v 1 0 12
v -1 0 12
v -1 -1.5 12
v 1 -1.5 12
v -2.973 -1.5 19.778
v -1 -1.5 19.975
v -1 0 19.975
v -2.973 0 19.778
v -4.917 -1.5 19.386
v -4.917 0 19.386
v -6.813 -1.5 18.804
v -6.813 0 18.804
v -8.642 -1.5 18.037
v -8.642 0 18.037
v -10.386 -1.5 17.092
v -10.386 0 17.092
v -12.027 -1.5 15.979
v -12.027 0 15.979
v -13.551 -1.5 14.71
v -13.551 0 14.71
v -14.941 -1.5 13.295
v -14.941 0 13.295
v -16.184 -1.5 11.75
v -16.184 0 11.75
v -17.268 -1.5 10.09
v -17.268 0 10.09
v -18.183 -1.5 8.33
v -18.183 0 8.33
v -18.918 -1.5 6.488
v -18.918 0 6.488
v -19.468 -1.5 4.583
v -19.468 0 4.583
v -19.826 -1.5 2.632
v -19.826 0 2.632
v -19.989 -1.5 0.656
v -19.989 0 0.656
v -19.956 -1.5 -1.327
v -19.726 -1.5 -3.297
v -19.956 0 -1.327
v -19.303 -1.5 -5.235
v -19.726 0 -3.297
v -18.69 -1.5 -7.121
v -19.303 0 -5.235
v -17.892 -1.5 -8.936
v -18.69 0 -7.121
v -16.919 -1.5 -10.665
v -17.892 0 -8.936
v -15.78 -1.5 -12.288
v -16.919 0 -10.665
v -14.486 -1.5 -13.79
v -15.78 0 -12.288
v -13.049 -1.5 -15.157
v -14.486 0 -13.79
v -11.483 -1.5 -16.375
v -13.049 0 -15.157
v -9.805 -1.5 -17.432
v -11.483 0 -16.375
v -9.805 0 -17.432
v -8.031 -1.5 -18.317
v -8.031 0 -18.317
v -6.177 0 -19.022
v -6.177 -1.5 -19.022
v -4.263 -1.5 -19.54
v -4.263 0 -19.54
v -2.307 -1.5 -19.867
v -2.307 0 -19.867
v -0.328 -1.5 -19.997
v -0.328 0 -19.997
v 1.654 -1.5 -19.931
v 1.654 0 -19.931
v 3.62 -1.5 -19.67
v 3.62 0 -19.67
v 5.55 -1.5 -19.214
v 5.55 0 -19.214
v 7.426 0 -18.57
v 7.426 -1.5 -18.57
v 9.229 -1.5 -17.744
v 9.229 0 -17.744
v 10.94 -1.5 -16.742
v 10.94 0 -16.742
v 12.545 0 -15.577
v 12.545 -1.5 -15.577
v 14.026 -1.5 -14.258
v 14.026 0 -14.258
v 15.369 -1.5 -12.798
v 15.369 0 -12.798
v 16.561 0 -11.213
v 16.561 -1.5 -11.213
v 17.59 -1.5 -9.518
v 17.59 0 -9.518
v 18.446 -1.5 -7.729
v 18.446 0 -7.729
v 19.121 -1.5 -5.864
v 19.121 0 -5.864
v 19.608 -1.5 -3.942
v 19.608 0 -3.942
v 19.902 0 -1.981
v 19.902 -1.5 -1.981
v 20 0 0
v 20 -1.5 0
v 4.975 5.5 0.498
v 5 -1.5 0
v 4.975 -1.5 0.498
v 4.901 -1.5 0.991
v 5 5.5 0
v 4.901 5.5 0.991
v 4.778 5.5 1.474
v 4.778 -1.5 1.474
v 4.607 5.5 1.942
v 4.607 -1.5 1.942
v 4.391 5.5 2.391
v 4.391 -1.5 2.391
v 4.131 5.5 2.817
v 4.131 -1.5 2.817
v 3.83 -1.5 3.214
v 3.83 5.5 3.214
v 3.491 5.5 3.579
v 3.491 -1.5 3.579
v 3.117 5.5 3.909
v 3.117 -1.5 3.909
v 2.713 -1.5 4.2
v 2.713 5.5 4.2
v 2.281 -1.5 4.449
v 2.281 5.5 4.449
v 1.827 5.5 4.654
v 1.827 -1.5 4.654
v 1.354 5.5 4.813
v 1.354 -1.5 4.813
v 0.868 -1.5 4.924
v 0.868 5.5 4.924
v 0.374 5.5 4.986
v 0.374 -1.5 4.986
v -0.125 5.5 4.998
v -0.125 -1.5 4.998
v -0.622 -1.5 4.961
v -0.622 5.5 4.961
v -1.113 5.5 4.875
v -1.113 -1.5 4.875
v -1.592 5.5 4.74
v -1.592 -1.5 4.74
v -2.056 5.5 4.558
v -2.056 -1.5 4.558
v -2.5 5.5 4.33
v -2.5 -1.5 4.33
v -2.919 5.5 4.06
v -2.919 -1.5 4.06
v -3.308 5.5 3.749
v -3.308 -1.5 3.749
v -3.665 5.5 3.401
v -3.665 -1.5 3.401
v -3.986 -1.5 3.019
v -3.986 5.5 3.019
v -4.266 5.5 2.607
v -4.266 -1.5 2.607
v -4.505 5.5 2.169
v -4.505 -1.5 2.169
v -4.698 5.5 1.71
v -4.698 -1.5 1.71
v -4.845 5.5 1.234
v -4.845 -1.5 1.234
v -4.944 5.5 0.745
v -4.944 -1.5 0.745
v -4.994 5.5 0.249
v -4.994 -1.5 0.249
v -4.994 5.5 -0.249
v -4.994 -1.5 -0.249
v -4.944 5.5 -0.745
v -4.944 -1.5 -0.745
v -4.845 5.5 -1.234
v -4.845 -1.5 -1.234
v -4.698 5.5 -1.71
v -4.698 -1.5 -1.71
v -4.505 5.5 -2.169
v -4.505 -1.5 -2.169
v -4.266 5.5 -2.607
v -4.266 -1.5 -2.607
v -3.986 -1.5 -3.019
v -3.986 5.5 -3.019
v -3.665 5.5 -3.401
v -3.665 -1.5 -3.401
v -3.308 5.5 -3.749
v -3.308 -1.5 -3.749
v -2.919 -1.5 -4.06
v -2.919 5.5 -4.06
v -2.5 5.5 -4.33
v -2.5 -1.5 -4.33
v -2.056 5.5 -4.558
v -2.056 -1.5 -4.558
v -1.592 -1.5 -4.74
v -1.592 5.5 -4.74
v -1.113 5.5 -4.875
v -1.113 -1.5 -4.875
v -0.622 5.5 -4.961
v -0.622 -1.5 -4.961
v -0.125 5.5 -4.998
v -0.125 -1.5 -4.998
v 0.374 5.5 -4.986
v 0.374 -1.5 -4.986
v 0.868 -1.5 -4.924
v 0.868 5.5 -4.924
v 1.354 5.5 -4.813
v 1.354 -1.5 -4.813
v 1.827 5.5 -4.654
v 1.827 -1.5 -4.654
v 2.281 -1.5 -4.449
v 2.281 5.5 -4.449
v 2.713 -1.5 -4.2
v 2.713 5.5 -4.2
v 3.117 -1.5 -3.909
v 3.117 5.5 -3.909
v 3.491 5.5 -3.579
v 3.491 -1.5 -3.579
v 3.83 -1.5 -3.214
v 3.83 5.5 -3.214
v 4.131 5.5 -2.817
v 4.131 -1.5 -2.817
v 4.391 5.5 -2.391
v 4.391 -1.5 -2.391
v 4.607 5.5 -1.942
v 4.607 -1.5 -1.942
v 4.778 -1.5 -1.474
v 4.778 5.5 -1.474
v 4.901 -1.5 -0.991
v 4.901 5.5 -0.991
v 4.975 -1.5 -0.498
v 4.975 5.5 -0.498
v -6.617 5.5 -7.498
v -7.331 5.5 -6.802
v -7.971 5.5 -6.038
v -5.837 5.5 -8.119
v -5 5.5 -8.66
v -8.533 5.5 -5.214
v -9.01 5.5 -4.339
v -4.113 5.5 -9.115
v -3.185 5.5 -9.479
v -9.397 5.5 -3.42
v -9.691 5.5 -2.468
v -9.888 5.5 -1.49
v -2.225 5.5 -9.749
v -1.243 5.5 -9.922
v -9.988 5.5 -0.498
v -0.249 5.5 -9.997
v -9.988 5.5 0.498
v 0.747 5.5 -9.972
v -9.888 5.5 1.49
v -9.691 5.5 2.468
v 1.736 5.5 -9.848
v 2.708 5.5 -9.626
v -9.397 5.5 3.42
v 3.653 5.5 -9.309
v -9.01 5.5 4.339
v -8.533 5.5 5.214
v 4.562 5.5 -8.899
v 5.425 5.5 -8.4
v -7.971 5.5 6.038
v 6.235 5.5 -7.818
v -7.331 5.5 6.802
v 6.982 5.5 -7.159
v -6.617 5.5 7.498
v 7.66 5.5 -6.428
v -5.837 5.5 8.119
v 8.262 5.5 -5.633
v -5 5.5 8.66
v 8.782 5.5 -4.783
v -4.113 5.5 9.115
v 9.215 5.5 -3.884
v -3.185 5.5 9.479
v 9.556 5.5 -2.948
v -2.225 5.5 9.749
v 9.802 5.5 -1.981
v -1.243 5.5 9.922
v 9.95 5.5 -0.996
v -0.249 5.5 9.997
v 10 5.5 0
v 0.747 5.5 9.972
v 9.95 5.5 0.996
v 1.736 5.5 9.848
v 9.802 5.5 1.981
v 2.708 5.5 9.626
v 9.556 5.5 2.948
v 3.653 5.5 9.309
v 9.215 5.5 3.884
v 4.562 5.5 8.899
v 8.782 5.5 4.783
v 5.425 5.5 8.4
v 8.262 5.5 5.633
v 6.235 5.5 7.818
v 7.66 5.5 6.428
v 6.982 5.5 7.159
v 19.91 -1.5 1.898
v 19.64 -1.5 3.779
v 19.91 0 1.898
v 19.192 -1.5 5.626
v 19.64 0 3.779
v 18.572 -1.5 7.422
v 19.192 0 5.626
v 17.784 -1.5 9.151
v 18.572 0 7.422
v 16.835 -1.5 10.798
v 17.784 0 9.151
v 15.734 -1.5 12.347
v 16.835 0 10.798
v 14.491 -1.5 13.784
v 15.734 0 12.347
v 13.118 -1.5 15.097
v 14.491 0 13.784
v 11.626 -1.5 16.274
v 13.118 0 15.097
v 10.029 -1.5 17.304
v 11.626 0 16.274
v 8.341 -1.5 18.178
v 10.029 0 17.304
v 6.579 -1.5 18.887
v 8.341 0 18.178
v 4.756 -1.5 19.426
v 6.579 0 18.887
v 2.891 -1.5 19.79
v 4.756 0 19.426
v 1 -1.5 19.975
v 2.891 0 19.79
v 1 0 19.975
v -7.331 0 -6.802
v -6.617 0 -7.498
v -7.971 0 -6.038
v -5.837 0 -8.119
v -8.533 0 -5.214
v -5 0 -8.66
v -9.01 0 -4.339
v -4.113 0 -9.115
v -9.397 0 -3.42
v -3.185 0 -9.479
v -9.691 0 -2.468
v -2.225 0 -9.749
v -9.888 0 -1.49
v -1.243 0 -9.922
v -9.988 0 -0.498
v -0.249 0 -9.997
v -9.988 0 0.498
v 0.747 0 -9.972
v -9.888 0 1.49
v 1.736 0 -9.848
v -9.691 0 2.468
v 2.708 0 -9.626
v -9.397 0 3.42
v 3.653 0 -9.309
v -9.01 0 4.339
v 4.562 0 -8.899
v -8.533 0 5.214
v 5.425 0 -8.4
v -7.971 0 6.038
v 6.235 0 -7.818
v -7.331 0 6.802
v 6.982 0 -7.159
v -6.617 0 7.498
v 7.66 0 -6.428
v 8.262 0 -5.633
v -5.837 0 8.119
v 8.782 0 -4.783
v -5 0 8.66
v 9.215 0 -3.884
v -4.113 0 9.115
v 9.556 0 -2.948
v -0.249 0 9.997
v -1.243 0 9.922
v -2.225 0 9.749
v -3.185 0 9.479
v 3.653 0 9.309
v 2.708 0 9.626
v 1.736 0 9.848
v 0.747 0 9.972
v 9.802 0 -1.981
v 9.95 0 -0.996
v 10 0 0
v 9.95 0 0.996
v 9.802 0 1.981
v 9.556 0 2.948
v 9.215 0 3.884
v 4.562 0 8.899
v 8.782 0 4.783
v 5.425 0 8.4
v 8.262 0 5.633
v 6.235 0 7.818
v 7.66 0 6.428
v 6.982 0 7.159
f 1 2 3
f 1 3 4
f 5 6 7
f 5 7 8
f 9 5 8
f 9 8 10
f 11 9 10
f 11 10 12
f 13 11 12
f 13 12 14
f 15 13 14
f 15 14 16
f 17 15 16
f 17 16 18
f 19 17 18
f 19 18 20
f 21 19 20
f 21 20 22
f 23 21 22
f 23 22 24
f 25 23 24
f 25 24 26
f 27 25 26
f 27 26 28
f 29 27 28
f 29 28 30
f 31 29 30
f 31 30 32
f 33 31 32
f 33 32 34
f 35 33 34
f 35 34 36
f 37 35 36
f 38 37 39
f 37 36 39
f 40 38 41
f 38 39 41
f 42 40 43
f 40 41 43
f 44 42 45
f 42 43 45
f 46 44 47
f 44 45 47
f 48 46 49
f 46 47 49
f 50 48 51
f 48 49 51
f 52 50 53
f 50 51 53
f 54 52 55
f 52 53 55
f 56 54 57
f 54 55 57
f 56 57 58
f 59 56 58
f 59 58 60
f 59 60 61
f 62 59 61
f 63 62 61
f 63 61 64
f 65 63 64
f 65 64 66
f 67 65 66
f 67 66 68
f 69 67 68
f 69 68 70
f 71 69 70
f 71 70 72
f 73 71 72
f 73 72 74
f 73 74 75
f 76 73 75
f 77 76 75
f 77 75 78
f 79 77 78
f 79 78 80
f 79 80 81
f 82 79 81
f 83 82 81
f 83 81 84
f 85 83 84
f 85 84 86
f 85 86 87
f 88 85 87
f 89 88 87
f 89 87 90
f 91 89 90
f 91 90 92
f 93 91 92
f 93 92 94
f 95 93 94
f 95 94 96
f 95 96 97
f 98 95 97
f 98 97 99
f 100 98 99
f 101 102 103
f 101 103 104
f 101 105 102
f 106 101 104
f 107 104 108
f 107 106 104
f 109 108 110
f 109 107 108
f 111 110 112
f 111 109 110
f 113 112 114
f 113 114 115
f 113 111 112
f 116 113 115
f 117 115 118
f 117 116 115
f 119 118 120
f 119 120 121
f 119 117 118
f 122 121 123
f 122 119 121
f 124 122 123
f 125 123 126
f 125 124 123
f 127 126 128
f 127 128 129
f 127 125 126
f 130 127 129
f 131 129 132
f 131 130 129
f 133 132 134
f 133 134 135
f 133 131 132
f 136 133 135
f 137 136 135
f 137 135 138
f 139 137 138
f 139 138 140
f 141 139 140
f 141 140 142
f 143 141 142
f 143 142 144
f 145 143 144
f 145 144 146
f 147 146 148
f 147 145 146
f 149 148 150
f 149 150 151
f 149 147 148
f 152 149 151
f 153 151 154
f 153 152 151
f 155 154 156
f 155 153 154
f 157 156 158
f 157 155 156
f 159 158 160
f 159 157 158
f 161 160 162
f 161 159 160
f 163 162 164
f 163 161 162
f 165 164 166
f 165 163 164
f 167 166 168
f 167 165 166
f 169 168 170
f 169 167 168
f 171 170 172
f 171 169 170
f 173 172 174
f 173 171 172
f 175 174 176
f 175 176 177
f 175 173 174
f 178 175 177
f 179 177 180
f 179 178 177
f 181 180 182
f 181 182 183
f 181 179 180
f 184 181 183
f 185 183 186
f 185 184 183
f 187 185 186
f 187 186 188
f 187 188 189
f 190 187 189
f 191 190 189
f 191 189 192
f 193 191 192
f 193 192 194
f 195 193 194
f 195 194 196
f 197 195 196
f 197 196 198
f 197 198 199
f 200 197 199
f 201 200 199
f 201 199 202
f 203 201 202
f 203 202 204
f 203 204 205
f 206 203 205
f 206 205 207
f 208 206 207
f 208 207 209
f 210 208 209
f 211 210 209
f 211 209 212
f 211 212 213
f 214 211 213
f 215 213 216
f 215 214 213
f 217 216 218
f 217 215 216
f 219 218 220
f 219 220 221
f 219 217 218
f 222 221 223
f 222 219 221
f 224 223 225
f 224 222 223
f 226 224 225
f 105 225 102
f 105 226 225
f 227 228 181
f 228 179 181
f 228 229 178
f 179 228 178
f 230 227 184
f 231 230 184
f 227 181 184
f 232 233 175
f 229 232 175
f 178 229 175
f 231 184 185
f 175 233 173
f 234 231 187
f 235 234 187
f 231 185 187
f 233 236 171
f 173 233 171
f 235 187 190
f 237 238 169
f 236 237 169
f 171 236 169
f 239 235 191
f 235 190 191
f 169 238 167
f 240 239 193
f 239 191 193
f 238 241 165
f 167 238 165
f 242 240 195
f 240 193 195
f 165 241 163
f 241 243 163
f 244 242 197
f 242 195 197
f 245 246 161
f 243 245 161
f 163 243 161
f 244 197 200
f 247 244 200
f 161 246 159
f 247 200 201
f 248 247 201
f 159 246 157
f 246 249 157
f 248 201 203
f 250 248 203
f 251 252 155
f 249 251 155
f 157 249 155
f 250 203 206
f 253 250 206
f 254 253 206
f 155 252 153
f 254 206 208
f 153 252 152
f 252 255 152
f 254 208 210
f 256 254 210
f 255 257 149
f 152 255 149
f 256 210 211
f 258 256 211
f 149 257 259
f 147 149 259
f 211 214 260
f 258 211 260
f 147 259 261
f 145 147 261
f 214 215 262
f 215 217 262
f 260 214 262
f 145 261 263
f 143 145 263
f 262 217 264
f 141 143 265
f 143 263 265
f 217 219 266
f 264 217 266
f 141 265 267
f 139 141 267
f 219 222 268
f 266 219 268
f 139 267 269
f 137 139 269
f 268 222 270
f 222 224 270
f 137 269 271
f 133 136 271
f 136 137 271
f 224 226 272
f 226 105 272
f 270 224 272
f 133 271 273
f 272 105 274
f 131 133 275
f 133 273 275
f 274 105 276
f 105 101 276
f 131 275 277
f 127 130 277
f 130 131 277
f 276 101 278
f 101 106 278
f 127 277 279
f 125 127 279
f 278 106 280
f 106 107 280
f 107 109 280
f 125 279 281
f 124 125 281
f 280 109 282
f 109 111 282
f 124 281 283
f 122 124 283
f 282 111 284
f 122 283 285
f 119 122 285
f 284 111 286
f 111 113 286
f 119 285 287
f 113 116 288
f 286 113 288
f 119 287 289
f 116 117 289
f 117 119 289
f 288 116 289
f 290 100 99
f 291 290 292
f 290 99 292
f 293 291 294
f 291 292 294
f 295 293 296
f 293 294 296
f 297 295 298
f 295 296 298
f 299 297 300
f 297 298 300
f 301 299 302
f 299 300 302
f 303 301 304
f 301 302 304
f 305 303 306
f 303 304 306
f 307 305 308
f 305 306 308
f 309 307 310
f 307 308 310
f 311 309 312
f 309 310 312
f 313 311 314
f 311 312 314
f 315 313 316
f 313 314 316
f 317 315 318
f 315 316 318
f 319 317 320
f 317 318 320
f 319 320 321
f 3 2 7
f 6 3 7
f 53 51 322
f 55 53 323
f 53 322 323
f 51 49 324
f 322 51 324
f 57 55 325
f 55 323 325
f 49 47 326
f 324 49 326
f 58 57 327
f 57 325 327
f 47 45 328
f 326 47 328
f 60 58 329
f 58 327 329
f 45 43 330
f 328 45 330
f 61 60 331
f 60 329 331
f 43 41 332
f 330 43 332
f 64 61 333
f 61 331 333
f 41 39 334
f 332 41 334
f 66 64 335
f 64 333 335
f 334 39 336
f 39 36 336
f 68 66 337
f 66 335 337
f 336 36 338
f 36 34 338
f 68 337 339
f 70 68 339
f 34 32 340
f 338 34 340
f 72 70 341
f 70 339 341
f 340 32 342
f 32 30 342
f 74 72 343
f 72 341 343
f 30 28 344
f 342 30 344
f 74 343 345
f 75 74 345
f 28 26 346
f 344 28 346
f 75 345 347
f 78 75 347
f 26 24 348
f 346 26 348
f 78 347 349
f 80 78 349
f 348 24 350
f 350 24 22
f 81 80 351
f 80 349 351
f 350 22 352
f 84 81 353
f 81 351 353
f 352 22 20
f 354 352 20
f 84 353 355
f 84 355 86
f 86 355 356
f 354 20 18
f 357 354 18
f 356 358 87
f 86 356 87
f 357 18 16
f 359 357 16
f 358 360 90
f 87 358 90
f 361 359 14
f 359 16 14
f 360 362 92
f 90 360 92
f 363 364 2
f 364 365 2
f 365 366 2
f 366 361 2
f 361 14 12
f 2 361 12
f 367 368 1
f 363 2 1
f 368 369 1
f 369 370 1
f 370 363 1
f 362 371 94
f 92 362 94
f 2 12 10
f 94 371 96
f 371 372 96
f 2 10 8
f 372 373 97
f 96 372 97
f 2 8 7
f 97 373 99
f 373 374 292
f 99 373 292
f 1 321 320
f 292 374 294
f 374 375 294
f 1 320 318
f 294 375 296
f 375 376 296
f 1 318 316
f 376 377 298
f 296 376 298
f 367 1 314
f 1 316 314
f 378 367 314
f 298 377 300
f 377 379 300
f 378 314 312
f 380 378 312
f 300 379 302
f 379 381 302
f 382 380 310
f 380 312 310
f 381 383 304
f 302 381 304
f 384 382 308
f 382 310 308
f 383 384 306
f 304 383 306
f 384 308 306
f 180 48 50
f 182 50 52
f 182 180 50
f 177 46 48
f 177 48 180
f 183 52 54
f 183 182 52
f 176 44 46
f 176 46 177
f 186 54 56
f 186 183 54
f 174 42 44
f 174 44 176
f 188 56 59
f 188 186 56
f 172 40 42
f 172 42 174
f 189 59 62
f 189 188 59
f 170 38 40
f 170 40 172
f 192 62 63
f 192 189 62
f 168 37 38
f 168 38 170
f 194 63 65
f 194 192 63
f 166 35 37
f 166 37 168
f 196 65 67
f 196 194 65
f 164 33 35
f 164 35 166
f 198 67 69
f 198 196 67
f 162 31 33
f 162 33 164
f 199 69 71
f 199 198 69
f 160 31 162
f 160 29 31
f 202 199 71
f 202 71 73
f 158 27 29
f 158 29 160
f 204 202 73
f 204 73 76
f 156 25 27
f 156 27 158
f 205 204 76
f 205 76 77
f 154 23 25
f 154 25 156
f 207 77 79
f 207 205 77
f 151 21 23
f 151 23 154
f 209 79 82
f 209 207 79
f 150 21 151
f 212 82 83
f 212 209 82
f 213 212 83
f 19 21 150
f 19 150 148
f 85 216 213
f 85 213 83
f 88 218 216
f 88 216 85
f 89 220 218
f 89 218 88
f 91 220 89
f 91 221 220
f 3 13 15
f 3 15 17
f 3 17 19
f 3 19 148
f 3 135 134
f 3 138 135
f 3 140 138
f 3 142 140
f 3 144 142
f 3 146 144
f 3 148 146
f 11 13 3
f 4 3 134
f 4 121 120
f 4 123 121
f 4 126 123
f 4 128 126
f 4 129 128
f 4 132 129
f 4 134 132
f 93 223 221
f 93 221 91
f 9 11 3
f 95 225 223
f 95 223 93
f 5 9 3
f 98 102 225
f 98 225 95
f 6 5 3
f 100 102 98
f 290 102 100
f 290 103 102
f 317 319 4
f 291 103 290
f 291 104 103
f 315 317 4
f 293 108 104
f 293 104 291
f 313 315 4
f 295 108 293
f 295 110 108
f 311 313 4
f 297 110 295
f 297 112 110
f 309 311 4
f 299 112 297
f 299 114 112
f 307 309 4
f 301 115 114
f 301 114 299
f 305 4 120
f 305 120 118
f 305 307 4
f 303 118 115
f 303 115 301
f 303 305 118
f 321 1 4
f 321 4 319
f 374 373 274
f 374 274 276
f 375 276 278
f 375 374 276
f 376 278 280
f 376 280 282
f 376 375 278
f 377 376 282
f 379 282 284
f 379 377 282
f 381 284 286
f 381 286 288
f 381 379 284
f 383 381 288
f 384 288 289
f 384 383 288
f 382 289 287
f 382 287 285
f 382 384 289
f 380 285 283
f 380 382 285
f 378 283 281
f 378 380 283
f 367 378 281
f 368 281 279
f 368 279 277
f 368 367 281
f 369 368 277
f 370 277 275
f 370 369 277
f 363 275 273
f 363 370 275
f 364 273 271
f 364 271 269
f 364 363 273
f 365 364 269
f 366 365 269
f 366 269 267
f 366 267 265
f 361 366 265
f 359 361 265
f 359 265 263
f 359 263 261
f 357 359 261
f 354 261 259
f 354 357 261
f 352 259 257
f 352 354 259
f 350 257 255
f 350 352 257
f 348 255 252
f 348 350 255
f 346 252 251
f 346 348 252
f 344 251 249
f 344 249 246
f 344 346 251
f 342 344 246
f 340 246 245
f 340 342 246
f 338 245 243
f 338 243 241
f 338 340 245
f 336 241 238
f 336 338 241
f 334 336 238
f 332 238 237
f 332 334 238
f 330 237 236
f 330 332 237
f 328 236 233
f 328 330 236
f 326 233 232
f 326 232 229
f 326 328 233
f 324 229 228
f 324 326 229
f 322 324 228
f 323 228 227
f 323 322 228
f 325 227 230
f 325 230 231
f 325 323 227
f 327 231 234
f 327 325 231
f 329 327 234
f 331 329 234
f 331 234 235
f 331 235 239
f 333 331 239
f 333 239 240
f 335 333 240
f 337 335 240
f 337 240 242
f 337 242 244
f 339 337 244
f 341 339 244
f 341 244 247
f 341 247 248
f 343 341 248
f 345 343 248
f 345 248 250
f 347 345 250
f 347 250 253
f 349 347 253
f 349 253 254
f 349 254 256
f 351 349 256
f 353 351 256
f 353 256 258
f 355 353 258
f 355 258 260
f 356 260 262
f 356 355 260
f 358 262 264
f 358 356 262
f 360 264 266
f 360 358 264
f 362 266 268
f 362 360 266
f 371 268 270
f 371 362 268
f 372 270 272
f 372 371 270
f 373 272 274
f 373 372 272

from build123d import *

# Parameters (mm, degrees)
F0_R     = 10
F0_R_2   = 5
F1_DEPTH = 5.5
F2_R     = 20
F2_R_2   = 5
F3_DEPTH = 1.5
F4_W     = 2
F4_H     = 10
F5_DEPTH = 1.501


with BuildPart() as f1:
    # F0 (on Front) → F1 (new body)
    with BuildSketch(Plane.XZ):
        Circle(F0_R)
        Circle(F0_R_2, mode=Mode.SUBTRACT)
    extrude(amount=-F1_DEPTH)

    # F2 (on Front) → F3 (join)
    with BuildSketch(Plane.XZ):
        Circle(F2_R)
        Circle(F2_R_2, mode=Mode.SUBTRACT)
    extrude(amount=F3_DEPTH)

    # F4 (on Front) → F5 (cut, through all)
    with BuildSketch(Plane.XZ):
        with Locations((0, 17)):
            Rectangle(F4_W, F4_H)
    extrude(amount=F5_DEPTH, mode=Mode.SUBTRACT)


solid = f1.part
